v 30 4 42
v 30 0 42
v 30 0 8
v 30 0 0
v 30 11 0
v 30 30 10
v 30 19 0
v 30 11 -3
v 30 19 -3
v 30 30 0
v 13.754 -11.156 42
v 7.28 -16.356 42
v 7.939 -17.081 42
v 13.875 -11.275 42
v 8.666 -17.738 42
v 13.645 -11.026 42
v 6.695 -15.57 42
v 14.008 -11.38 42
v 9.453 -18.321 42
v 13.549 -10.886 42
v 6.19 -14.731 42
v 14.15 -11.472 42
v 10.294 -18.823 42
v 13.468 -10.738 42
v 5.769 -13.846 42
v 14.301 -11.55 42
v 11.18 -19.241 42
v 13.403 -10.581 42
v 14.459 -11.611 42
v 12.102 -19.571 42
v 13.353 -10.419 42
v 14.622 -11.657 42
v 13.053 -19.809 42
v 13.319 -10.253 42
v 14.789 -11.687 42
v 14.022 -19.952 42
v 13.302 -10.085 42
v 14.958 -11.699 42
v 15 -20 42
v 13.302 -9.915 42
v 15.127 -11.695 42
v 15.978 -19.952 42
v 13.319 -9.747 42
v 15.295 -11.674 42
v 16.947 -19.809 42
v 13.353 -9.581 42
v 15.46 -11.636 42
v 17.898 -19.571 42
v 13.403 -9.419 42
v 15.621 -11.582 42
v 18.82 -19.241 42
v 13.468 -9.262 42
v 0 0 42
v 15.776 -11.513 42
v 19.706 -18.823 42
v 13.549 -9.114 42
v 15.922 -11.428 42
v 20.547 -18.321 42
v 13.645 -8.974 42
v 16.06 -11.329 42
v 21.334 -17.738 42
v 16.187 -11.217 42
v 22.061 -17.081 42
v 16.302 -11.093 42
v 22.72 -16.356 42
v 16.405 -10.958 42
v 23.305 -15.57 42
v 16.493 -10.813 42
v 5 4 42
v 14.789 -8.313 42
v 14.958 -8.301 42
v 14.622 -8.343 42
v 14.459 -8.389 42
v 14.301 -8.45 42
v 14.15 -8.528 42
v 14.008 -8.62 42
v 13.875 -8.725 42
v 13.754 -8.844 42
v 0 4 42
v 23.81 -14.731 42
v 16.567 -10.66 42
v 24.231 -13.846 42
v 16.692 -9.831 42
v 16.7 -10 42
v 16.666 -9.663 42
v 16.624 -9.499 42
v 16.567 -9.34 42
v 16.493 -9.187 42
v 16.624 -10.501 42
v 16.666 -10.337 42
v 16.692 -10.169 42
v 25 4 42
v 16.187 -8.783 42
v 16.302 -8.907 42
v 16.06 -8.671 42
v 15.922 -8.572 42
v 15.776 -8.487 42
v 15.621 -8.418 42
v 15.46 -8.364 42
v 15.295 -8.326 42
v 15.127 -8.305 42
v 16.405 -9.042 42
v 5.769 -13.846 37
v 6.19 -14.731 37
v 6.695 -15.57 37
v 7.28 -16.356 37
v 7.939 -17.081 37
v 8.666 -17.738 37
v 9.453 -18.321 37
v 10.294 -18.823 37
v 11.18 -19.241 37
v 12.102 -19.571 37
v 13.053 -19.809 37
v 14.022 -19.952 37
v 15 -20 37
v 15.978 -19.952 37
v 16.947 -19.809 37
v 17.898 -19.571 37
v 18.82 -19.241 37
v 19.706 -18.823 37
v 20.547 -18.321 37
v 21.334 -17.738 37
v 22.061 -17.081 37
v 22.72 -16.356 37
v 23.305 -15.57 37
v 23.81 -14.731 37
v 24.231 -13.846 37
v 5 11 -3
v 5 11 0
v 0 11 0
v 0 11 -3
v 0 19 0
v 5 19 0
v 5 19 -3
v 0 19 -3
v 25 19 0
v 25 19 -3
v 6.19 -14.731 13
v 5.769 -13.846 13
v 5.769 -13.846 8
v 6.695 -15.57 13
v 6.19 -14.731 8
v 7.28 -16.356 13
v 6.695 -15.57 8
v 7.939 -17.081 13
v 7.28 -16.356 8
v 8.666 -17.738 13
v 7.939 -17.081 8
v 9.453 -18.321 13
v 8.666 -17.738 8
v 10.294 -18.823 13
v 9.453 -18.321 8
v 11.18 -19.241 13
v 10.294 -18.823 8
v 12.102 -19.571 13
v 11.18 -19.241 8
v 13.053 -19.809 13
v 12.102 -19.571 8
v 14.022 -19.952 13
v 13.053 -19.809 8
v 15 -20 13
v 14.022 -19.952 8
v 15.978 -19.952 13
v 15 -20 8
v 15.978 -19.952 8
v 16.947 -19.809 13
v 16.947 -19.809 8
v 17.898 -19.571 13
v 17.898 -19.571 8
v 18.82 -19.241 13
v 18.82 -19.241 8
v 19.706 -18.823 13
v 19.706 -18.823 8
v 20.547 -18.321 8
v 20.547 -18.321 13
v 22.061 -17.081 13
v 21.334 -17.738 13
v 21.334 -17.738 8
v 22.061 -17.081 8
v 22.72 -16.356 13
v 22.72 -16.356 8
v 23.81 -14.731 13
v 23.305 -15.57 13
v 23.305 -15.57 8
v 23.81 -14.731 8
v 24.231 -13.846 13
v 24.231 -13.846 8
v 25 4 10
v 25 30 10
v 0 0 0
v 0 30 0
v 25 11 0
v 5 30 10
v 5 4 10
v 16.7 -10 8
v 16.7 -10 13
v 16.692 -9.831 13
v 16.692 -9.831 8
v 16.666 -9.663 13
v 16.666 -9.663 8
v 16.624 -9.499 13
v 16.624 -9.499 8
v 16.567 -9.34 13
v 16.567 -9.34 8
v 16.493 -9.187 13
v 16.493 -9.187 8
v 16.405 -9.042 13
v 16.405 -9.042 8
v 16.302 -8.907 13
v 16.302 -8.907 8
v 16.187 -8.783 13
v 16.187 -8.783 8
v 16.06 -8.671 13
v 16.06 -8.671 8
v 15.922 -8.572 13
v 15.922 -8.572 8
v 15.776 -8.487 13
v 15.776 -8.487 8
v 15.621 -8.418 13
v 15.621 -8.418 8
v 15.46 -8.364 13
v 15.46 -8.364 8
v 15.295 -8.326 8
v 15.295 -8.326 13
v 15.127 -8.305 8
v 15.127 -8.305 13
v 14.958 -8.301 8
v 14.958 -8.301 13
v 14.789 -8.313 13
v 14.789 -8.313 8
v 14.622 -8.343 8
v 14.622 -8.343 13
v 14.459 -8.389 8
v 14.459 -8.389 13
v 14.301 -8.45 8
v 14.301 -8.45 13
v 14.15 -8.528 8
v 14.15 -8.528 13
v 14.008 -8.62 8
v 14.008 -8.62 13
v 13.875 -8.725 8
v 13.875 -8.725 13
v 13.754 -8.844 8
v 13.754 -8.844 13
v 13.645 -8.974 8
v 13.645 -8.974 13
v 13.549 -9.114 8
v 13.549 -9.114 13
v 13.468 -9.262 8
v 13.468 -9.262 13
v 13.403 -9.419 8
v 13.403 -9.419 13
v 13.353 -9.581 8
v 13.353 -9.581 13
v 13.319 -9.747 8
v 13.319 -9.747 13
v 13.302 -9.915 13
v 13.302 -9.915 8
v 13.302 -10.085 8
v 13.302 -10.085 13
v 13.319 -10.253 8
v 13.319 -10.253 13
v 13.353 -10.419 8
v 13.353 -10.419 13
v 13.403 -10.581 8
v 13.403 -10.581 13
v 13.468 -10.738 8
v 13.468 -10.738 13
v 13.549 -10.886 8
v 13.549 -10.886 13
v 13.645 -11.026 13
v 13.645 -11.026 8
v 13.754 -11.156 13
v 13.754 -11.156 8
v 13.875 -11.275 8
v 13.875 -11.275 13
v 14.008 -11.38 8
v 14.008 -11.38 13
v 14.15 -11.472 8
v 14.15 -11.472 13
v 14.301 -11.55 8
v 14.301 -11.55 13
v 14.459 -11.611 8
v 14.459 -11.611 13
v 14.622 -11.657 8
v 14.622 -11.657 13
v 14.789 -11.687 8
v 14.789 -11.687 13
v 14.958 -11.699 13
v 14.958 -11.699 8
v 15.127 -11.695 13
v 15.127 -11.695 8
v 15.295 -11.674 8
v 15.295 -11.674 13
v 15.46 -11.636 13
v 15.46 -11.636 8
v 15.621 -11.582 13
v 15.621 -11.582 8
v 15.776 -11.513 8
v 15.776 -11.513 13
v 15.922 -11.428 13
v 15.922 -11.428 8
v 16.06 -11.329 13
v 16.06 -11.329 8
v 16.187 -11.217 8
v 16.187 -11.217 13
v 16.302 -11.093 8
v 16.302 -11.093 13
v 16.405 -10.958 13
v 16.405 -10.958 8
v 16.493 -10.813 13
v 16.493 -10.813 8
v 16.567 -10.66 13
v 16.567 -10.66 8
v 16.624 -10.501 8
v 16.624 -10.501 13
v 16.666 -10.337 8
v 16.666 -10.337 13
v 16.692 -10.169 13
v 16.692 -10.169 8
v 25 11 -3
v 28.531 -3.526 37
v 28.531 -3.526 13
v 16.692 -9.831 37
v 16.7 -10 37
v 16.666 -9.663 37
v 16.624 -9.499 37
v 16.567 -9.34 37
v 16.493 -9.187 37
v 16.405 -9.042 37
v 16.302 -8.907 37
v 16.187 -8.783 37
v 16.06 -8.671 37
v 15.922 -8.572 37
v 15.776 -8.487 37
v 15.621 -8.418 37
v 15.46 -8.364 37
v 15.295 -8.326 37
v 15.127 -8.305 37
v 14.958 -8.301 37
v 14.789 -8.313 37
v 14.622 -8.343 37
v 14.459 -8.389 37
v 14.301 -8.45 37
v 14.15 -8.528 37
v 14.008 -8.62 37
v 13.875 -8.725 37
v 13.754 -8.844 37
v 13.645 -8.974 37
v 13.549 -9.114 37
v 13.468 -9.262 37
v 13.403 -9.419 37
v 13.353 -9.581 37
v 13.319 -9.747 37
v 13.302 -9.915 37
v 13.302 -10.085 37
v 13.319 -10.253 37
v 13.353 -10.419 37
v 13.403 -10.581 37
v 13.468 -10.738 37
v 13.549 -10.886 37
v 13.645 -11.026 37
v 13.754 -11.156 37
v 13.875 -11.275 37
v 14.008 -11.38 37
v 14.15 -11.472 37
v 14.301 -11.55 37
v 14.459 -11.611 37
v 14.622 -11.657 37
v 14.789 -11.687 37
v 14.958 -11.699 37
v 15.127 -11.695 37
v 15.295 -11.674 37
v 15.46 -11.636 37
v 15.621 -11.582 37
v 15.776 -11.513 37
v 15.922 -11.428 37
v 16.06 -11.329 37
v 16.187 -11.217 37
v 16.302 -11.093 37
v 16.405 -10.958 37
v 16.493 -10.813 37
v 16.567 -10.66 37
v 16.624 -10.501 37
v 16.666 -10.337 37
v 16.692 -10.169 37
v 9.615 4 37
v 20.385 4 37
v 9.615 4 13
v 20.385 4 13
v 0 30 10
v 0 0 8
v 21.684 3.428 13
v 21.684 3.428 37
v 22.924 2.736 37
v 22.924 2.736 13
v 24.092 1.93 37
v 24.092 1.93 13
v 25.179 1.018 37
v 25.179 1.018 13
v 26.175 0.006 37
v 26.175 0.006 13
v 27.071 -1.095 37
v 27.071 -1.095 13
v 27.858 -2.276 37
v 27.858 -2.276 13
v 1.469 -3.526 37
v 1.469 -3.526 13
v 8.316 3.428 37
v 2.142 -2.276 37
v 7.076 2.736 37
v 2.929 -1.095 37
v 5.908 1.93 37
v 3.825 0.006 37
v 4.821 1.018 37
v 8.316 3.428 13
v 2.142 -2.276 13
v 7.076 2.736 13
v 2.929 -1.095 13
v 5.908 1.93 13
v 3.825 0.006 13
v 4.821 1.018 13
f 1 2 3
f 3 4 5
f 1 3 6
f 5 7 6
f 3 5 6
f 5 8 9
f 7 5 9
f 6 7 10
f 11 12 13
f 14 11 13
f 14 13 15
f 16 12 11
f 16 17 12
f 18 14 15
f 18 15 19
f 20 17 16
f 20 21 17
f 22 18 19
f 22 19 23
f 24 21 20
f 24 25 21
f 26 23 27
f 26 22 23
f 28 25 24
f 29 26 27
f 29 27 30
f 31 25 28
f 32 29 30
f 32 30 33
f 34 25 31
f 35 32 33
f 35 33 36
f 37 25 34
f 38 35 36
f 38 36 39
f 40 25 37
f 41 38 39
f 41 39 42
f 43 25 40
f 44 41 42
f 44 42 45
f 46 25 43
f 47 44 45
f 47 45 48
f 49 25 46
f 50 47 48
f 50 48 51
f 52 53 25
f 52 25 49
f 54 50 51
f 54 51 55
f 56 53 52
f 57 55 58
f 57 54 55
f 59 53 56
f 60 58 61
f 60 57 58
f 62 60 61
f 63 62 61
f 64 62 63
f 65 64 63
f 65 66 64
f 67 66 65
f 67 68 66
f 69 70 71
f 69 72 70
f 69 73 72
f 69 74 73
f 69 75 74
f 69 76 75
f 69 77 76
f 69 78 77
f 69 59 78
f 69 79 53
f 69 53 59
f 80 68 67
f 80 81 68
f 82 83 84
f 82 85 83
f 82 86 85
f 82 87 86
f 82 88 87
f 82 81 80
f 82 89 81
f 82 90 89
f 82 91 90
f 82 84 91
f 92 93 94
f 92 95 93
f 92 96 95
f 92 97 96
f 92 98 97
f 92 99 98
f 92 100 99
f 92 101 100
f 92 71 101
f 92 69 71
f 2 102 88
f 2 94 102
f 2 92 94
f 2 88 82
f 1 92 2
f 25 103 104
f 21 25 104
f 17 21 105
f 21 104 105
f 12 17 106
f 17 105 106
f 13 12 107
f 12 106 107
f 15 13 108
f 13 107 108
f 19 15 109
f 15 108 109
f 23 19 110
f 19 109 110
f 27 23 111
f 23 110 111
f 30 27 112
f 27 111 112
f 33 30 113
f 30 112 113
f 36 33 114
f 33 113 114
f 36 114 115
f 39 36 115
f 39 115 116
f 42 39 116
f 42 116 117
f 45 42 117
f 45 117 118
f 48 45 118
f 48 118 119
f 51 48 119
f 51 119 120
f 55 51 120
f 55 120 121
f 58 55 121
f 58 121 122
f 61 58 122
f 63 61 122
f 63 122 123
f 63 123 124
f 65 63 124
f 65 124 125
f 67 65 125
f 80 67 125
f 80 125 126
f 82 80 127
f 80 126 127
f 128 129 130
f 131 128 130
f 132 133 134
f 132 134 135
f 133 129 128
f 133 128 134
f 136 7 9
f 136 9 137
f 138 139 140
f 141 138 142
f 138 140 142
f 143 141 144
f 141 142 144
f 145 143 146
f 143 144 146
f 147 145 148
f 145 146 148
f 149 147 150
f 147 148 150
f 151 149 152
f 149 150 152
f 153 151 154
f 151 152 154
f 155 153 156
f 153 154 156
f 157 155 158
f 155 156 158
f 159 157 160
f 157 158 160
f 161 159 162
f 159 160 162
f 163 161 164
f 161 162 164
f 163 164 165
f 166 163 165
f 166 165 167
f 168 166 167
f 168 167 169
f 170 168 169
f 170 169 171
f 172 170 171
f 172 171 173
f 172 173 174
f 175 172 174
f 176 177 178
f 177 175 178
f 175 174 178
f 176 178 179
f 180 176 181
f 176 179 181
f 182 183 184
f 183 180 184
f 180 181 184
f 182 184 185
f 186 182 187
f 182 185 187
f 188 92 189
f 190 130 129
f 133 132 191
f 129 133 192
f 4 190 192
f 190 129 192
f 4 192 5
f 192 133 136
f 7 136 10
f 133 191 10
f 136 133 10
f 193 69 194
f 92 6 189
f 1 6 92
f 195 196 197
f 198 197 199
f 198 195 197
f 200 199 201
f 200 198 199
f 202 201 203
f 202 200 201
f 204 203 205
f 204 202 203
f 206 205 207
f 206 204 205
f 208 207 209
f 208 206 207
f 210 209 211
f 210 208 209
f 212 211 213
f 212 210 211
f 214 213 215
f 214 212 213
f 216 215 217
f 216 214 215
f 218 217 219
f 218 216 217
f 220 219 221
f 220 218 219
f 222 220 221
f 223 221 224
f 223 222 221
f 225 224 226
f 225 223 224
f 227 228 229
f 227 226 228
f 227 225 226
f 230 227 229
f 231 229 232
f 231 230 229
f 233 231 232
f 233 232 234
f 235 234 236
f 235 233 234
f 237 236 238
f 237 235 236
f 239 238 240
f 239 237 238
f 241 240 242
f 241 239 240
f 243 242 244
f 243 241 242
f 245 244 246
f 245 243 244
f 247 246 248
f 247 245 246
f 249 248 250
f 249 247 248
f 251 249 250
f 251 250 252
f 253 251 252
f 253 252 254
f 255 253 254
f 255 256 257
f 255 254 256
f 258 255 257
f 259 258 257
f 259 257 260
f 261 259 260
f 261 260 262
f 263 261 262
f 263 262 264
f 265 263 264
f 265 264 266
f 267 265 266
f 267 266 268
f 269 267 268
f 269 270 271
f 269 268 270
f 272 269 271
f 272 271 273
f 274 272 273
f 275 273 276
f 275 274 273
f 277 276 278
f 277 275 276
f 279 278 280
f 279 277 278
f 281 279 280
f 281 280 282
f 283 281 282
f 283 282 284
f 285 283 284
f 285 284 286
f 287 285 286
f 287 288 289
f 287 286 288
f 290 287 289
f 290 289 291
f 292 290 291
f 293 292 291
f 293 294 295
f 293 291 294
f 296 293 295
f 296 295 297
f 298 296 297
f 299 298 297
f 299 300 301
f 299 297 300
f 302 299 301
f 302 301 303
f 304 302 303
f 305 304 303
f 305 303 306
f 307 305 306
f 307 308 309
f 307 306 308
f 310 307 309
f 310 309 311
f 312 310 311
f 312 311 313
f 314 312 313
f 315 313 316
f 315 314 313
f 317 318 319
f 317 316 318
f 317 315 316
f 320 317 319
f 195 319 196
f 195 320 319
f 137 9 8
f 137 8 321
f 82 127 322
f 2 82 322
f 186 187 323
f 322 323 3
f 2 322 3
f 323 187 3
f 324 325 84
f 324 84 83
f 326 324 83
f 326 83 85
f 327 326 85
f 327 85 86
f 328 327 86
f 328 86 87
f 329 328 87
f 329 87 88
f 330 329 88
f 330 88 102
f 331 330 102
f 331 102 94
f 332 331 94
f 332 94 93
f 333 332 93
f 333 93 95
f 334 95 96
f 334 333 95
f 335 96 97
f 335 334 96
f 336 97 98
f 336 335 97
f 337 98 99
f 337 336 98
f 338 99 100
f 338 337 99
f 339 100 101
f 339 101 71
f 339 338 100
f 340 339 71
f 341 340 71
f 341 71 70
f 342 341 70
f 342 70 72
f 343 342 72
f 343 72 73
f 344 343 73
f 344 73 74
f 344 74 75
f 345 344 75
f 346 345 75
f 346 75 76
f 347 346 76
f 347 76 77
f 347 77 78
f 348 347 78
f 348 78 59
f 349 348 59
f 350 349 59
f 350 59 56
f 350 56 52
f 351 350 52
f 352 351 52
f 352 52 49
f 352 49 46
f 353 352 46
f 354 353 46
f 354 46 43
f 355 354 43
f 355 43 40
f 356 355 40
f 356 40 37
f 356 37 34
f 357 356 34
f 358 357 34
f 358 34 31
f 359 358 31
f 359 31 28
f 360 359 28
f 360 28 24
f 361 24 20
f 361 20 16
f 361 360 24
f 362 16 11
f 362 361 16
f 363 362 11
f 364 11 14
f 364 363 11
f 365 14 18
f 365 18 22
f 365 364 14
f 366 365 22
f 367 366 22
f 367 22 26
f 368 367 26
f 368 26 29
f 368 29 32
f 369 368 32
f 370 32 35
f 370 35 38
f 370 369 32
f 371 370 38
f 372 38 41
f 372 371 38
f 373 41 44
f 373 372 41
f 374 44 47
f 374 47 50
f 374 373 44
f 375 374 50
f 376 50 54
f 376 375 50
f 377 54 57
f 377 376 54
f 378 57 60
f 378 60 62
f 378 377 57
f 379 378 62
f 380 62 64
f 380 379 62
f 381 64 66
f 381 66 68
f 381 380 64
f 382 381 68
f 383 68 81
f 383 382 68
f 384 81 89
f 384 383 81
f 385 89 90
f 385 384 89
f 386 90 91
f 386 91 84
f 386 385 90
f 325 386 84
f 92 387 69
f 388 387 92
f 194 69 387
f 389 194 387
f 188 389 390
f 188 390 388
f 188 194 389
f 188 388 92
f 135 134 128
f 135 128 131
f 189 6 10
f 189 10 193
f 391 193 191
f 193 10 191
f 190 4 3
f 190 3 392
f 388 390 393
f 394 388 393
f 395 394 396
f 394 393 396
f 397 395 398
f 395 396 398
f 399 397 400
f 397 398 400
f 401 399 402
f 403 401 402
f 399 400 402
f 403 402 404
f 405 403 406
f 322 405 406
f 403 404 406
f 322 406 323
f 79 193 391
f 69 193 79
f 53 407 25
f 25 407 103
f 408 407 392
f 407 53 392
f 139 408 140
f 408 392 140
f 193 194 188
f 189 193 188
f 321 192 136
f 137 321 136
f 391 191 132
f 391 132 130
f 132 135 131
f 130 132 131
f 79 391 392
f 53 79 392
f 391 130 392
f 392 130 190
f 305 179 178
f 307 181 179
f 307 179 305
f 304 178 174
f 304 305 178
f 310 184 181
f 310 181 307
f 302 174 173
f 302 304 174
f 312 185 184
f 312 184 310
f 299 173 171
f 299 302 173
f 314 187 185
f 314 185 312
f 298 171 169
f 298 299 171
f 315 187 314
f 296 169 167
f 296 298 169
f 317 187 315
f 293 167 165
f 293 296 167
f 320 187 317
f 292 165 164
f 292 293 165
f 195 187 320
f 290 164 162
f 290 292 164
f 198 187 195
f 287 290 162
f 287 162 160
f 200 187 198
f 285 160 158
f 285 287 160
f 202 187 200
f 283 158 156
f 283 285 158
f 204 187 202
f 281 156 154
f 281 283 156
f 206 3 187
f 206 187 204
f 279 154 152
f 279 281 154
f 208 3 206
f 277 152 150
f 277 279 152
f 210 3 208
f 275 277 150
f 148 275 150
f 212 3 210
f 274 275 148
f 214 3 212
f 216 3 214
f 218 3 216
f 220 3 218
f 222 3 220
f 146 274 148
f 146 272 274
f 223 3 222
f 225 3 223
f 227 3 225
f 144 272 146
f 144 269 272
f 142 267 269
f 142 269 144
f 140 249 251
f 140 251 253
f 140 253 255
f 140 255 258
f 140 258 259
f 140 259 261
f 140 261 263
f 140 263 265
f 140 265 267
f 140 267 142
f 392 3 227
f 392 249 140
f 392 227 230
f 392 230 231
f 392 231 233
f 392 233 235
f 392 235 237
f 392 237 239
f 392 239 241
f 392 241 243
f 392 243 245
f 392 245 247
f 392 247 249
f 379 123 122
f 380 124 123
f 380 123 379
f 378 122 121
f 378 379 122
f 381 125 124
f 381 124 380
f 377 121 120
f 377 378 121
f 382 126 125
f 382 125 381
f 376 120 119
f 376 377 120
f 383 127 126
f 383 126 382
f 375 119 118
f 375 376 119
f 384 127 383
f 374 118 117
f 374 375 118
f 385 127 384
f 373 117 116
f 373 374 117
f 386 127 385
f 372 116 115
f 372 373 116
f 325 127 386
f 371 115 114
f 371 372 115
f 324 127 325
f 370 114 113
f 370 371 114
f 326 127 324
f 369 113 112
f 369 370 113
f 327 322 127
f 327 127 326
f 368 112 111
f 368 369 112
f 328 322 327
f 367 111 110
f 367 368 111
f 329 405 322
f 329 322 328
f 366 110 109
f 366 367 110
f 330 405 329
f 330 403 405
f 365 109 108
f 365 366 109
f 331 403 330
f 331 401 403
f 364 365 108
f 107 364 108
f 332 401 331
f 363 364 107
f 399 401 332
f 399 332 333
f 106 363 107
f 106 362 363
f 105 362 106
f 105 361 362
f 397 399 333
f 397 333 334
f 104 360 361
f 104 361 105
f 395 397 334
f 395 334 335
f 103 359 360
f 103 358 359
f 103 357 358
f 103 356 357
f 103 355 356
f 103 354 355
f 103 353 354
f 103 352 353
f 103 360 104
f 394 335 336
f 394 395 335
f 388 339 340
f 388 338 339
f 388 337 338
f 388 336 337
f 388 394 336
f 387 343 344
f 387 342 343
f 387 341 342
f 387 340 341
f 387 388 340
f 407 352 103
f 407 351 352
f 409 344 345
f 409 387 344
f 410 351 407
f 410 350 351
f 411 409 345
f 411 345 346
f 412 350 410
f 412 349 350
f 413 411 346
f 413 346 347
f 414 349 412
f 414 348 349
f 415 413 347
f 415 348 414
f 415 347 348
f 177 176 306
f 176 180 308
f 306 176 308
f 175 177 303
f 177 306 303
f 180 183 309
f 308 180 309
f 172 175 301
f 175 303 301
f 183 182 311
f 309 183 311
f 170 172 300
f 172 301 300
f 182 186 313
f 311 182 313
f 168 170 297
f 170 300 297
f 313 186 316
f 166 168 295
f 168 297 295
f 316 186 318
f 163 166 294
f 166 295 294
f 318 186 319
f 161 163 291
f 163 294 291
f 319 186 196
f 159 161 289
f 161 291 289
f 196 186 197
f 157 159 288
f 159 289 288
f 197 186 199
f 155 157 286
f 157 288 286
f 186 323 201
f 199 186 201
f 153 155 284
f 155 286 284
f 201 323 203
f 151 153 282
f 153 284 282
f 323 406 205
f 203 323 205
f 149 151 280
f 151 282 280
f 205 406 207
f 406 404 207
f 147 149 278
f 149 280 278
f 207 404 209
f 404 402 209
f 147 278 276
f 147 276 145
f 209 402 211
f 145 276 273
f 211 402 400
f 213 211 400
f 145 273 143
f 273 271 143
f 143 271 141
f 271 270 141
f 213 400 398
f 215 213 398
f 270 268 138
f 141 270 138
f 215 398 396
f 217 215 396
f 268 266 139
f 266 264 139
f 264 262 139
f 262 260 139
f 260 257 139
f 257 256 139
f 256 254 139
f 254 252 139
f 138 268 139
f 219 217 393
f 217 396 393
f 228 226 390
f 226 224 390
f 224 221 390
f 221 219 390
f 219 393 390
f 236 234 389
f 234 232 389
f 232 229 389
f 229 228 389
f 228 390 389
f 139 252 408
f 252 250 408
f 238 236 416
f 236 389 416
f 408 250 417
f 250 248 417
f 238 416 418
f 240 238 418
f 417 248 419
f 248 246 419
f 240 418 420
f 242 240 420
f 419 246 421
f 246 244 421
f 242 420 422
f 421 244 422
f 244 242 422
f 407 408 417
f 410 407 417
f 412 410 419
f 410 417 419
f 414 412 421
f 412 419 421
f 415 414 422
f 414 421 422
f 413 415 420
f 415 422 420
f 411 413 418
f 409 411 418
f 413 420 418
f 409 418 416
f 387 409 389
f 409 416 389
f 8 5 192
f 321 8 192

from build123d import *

# Parameters (mm, degrees)
EXTRUDE_1_DEPTH     = 42
SKETCH_2_R          = 15
CUT_EXTRUDE_1_DEPTH = 12
SKETCH_3_W          = 30
SKETCH_3_H          = 20
CUT_EXTRUDE_2_DEPTH = 8
SKETCH_4_W          = 5
SKETCH_4_H          = 8
EXTRUDE_2_DEPTH     = 3
OTHER_START         = 8
OTHER_1_OUTLINE_R   = 1.7
OTHER_1_DEPTH       = 34
SKETCH_7_W          = 20
SKETCH_7_H          = 32
CUT_EXTRUDE_6_DEPTH = 26
CUT_EXTRUDE_7_DEPTH = 60.699246226


# Read off the part's stored shape, not the designer's step: 高级异型孔1
with BuildPart() as part:
    # 草图1 → 凸台-拉伸1 (new body)
    with BuildSketch(Plane.XY):
        with BuildLine():
            Line((0, 0), (5.769230769, -13.846153846))
            ThreePointArc((5.769230769, -13.846153846), (15, -20), (24.230769231, -13.846153846))
            Line((24.230769231, -13.846153846), (30, 0))
            Line((30, 0), (30, 30))
            Line((30, 30), (0, 30))
            Line((0, 30), (0, 0))
        make_face()
    extrude(amount=EXTRUDE_1_DEPTH)

    # 草图2 → 切除-拉伸1 (cut, symmetric)
    with BuildSketch(Plane(origin=(0, 0, 25), x_dir=(-1, 0, 0), z_dir=(0, 0, -1))):
        with Locations((-15, -10)):
            Circle(SKETCH_2_R)
    extrude(amount=CUT_EXTRUDE_1_DEPTH, both=True, mode=Mode.SUBTRACT)

    # 草图3 → 切除-拉伸2 (cut)
    with BuildSketch(Plane(origin=(0, 0, 0), x_dir=(-1, 0, 0), z_dir=(0, 0, -1))):
        with Locations((-15, -10)):
            Rectangle(SKETCH_3_W, SKETCH_3_H)
    extrude(amount=-CUT_EXTRUDE_2_DEPTH, mode=Mode.SUBTRACT)

    # 草图4 → 凸台-拉伸2 (add)
    with BuildSketch(Plane(origin=(0, 0, 0), x_dir=(-1, 0, 0), z_dir=(0, 0, -1))):
        with Locations((-27.5, 15)):
            Rectangle(SKETCH_4_W, SKETCH_4_H)
        with Locations((-2.5, 15)):
            Rectangle(SKETCH_4_W, SKETCH_4_H)
    extrude(amount=EXTRUDE_2_DEPTH)

    # 高级异型孔1 outline → 高级异型孔1 (cut)
    with BuildSketch(Plane.XY.offset(OTHER_START)):
        with Locations((15, -10)):
            Circle(OTHER_1_OUTLINE_R)
    extrude(amount=OTHER_1_DEPTH, mode=Mode.SUBTRACT)

    # 草图7 → 切除-拉伸6 (cut)
    with BuildSketch(Plane(origin=(0, 30, 0), x_dir=(1, 0, 0), z_dir=(0, 1, 0))):
        with Locations((15, -26)):
            Rectangle(SKETCH_7_W, SKETCH_7_H)
    extrude(amount=-CUT_EXTRUDE_6_DEPTH, mode=Mode.SUBTRACT)

    # 草图8 → 切除-拉伸7 (cut, through all)
    with BuildSketch(Plane(origin=(30, 0, 0), x_dir=(0, 0, -1), z_dir=(1, 0, 0))):
        Polygon((-42, 30), (-10, 30), (-42, 4), align=None)
    extrude(amount=-CUT_EXTRUDE_7_DEPTH, mode=Mode.SUBTRACT)


solid = part.part
